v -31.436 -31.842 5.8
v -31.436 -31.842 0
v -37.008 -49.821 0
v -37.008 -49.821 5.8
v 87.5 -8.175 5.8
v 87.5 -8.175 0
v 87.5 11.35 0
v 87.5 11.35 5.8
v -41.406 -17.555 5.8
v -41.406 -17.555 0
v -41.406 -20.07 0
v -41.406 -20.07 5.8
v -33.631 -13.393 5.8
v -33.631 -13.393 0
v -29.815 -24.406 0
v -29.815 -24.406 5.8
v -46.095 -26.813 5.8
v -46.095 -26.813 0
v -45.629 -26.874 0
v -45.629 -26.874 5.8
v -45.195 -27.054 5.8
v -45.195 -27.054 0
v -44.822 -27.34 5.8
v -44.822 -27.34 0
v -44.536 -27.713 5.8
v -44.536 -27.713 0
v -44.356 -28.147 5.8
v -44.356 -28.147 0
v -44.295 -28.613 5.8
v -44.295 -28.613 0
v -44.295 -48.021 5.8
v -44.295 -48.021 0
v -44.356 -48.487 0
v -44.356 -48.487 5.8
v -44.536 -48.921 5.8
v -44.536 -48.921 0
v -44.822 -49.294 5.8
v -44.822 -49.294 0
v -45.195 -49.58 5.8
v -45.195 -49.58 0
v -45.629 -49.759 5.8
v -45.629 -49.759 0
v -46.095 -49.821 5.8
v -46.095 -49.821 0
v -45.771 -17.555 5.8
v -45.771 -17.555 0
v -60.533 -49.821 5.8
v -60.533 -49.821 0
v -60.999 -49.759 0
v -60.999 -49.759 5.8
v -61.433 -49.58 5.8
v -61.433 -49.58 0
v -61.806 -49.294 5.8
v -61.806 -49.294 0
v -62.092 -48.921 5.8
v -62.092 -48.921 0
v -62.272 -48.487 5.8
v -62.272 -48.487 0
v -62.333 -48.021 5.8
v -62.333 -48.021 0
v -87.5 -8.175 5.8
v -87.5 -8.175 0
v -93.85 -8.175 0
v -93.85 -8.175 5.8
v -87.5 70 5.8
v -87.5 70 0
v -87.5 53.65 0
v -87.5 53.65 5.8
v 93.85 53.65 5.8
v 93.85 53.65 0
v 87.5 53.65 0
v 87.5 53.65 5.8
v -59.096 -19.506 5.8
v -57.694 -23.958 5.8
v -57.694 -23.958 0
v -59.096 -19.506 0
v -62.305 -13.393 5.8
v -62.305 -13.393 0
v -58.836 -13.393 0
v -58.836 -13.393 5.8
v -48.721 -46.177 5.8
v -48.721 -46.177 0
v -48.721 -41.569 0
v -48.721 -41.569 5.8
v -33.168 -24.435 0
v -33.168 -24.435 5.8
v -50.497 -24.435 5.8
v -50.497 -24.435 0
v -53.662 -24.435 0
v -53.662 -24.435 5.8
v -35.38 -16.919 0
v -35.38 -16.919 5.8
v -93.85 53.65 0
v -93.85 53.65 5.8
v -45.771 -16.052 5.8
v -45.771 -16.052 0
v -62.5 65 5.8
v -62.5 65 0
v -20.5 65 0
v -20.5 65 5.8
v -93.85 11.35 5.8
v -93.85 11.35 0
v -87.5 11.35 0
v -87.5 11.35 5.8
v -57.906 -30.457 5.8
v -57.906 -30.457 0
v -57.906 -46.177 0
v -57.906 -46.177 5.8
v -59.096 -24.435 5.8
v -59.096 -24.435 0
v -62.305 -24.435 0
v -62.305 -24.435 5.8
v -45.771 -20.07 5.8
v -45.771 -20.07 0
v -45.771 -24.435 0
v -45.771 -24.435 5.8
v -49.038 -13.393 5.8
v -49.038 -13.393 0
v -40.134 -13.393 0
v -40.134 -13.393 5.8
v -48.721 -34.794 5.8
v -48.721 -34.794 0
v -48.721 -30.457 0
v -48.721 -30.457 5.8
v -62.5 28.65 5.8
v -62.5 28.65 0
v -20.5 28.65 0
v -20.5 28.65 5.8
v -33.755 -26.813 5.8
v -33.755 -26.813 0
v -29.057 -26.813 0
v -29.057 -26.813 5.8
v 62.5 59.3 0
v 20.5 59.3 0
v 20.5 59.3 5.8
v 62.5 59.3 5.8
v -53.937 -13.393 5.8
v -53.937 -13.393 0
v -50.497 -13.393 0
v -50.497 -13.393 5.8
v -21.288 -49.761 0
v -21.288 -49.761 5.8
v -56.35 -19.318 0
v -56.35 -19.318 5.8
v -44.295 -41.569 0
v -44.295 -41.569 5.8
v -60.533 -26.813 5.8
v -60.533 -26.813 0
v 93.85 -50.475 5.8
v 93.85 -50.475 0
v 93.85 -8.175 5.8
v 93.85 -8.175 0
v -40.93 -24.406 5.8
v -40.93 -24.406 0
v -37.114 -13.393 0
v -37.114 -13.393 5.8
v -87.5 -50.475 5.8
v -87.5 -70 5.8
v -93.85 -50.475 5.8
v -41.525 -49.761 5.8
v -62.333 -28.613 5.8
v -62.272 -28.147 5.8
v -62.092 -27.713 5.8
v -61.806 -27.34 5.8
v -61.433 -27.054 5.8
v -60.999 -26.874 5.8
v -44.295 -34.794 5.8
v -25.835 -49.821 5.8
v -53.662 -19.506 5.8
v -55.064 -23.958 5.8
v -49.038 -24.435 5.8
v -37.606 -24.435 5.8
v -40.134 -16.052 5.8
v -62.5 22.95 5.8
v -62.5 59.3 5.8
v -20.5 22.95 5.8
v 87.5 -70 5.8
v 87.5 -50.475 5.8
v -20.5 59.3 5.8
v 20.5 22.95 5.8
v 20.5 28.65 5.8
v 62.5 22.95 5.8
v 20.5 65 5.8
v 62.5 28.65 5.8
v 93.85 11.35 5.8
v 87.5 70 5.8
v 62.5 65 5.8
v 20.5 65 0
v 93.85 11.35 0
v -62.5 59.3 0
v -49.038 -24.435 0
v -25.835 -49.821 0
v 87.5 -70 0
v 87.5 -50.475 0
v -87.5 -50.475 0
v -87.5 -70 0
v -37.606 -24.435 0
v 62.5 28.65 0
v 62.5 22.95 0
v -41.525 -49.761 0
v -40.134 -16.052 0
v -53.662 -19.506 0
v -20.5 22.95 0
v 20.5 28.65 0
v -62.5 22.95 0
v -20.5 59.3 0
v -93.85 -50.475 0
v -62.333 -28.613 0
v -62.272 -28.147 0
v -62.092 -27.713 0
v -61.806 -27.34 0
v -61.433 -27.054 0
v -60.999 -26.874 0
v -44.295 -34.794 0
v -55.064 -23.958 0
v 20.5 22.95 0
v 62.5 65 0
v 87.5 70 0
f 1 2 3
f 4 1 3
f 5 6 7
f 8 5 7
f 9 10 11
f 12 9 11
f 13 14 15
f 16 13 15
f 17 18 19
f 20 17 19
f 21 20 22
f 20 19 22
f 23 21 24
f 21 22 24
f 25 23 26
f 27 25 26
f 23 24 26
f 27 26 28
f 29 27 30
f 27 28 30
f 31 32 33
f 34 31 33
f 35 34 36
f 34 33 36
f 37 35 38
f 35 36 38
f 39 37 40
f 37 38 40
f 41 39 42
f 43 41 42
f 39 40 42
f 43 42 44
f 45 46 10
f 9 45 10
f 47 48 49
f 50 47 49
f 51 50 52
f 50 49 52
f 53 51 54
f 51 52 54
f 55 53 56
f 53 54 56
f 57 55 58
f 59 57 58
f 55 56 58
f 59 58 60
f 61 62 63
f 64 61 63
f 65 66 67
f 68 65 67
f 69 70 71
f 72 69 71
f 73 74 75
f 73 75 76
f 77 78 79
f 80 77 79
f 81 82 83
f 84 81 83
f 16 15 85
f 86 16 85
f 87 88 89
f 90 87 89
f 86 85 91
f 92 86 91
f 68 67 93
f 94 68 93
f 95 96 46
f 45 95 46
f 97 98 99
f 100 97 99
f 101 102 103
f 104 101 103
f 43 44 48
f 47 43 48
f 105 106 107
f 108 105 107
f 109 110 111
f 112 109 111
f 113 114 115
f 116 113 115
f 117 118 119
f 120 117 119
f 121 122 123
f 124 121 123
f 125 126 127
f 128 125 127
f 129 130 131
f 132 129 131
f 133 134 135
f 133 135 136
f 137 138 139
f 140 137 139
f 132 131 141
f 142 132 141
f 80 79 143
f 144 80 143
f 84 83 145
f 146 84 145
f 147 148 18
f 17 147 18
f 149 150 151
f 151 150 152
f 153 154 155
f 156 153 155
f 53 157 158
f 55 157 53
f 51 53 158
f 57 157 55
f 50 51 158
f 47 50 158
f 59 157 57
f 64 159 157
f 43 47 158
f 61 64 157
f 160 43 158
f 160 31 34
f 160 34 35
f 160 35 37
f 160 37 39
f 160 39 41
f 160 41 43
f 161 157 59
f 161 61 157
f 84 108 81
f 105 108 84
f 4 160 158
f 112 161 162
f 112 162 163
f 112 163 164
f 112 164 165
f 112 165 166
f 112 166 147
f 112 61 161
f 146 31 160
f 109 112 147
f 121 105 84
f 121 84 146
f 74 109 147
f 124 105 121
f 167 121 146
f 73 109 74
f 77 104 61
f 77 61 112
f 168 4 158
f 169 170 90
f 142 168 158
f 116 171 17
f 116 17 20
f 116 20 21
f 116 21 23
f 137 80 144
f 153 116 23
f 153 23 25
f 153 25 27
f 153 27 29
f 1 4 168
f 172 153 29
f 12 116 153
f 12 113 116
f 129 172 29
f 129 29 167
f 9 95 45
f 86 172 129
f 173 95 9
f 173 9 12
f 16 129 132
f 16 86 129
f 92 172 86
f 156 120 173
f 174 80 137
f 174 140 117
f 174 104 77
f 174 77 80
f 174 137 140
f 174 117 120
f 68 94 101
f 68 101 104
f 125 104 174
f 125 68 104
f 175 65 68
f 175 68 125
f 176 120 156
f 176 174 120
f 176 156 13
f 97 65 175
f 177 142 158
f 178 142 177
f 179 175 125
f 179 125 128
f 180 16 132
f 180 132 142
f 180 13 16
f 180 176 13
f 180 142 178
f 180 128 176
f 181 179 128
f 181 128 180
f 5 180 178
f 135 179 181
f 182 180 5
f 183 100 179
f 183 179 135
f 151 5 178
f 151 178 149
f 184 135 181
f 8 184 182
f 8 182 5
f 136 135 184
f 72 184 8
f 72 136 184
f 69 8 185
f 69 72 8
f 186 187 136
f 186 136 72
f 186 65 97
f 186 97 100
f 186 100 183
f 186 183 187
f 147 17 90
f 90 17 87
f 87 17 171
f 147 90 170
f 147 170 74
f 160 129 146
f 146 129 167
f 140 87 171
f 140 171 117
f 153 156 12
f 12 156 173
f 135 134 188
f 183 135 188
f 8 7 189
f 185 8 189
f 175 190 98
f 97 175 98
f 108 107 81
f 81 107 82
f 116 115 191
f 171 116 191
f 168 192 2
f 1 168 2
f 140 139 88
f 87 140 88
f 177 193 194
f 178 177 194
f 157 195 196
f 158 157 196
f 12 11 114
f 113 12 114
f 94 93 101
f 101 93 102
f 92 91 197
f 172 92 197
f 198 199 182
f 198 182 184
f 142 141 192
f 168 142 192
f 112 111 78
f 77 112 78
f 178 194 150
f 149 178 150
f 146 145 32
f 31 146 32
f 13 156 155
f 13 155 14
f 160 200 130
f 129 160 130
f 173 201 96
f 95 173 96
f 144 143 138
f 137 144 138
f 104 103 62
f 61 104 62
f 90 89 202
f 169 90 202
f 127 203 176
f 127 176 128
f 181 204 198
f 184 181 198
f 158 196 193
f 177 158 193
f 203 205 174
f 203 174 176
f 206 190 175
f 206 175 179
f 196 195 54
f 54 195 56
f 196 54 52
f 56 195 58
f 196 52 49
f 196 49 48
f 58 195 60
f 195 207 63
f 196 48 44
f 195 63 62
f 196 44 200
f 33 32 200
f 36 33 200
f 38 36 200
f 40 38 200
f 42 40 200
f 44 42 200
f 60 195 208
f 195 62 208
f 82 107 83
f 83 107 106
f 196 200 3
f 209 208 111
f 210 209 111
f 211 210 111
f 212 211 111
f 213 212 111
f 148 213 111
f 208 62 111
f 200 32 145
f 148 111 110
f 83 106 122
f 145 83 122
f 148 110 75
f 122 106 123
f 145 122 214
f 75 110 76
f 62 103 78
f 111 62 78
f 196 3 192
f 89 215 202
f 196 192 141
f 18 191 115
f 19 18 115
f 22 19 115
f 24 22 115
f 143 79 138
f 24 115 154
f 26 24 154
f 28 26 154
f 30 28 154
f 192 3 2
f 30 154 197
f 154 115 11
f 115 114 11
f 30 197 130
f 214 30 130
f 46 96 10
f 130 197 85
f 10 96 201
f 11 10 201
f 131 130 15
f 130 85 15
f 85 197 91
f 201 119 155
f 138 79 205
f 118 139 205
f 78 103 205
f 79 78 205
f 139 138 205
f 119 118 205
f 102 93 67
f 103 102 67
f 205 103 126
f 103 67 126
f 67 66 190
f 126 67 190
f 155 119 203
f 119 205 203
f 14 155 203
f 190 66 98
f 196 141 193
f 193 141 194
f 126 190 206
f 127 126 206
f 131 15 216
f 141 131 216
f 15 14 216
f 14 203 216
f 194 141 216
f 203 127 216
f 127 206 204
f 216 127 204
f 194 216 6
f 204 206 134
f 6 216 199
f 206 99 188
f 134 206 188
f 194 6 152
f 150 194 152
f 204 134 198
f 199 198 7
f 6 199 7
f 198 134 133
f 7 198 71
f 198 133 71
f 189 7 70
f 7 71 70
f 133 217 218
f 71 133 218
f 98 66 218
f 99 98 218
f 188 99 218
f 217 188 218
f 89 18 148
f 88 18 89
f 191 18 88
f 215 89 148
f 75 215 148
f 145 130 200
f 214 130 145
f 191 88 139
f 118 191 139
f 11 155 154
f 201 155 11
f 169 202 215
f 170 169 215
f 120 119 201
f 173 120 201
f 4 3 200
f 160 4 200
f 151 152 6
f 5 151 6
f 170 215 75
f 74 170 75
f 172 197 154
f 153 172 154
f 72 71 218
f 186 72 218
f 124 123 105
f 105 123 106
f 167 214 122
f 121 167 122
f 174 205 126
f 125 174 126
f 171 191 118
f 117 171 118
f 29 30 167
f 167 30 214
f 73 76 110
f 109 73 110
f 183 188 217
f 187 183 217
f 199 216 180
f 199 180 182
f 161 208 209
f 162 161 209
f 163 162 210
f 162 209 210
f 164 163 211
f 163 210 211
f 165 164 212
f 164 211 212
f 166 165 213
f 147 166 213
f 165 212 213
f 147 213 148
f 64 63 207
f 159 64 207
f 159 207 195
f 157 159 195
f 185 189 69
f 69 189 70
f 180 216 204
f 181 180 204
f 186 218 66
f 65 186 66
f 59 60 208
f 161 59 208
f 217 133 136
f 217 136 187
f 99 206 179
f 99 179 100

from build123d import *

# Parameters (mm, degrees)
F0_W     = 42
F0_H     = 5.7
F1_DEPTH = 5.8


with BuildPart() as f1:
    # F0 (on Top) → F1 (new body)
    with BuildSketch(Plane.XY):
        Polygon((87.5, 53.65), (87.5, 70), (-87.5, 70), (-87.5, 53.65), (-93.85, 53.65), (-93.85, 11.35), (-87.5, 11.35), (-87.5, -8.175), (-93.85, -8.175), (-93.85, -50.475), (-87.5, -50.475), (-87.5, -70), (87.5, -70), (87.5, -50.475), (93.85, -50.475), (93.85, -8.175), (87.5, -8.175), (87.5, 11.35), (93.85, 11.35), (93.85, 53.65), align=None)
        with BuildLine():
            ThreePointArc((-44.294584, -48.020755), (-44.821792, -49.293547), (-46.094584, -49.820755))
            Line((-46.094584, -49.820755), (-60.533295, -49.820757))
            ThreePointArc((-60.533295, -49.820757), (-61.806087, -49.293549), (-62.333295, -48.020757))
            Line((-62.333295, -48.020757), (-62.333295, -28.613132))
            ThreePointArc((-62.333295, -28.613132), (-61.806087, -27.34034), (-60.533295, -26.813132))
            Line((-60.533295, -26.813132), (-46.094584, -26.813134))
            ThreePointArc((-46.094584, -26.813134), (-44.821792, -27.340342), (-44.294584, -28.613134))
            Line((-44.294584, -28.613134), (-44.294584, -34.793572))
            Line((-44.294584, -34.793572), (-48.72147, -34.793572))
            Line((-48.72147, -34.793572), (-48.72147, -30.456954))
            Line((-48.72147, -30.456954), (-57.906409, -30.456954))
            Line((-57.906409, -30.456954), (-57.906409, -46.176934))
            Line((-57.906409, -46.176934), (-48.72147, -46.176934))
            Line((-48.72147, -46.176934), (-48.72147, -41.569373))
            Line((-48.72147, -41.569373), (-44.294584, -41.569373))
            Line((-44.294584, -41.569373), (-44.294584, -48.020755))
        make_face(mode=Mode.SUBTRACT)
        Polygon((-37.007503, -49.820755), (-41.524656, -49.76053), (-33.755004, -26.813132), (-29.057175, -26.813132), (-21.287593, -49.76053), (-25.834929, -49.820755), (-31.436272, -31.842268), align=None, mode=Mode.SUBTRACT)
        Polygon((-59.096379, -24.434737), (-62.305008, -24.434737), (-62.305008, -13.392651), (-58.836246, -13.392651), (-56.350317, -19.318423), (-53.936685, -13.392651), (-50.496843, -13.392651), (-50.496843, -24.434737), (-53.662093, -24.434737), (-53.662093, -19.506257), (-55.064043, -23.957851), (-57.694499, -23.957851), (-59.096379, -19.506257), align=None, mode=Mode.SUBTRACT)
        Polygon((-45.771218, -20.069901), (-45.771218, -24.434737), (-49.037616, -24.434737), (-49.037616, -13.392651), (-40.134498, -13.392651), (-40.134498, -16.051955), (-45.771218, -16.051955), (-45.771218, -17.555053), (-41.406382, -17.555053), (-41.406382, -20.069901), align=None, mode=Mode.SUBTRACT)
        Polygon((-37.605611, -24.434737), (-40.929777, -24.405818), (-37.114195, -13.392651), (-33.631044, -13.392651), (-29.815392, -24.405818), (-33.168477, -24.434737), (-35.379814, -16.919111), align=None, mode=Mode.SUBTRACT)
        with Locations((-41.5, 25.8)):
            Rectangle(F0_W, F0_H, mode=Mode.SUBTRACT)
        with Locations((-41.5, 62.15)):
            Rectangle(F0_W, F0_H, mode=Mode.SUBTRACT)
        with Locations((41.5, 25.8)):
            Rectangle(F0_W, F0_H, mode=Mode.SUBTRACT)
        with Locations((41.5, 62.15)):
            Rectangle(F0_W, F0_H, mode=Mode.SUBTRACT)
    extrude(amount=F1_DEPTH)


solid = f1.part
